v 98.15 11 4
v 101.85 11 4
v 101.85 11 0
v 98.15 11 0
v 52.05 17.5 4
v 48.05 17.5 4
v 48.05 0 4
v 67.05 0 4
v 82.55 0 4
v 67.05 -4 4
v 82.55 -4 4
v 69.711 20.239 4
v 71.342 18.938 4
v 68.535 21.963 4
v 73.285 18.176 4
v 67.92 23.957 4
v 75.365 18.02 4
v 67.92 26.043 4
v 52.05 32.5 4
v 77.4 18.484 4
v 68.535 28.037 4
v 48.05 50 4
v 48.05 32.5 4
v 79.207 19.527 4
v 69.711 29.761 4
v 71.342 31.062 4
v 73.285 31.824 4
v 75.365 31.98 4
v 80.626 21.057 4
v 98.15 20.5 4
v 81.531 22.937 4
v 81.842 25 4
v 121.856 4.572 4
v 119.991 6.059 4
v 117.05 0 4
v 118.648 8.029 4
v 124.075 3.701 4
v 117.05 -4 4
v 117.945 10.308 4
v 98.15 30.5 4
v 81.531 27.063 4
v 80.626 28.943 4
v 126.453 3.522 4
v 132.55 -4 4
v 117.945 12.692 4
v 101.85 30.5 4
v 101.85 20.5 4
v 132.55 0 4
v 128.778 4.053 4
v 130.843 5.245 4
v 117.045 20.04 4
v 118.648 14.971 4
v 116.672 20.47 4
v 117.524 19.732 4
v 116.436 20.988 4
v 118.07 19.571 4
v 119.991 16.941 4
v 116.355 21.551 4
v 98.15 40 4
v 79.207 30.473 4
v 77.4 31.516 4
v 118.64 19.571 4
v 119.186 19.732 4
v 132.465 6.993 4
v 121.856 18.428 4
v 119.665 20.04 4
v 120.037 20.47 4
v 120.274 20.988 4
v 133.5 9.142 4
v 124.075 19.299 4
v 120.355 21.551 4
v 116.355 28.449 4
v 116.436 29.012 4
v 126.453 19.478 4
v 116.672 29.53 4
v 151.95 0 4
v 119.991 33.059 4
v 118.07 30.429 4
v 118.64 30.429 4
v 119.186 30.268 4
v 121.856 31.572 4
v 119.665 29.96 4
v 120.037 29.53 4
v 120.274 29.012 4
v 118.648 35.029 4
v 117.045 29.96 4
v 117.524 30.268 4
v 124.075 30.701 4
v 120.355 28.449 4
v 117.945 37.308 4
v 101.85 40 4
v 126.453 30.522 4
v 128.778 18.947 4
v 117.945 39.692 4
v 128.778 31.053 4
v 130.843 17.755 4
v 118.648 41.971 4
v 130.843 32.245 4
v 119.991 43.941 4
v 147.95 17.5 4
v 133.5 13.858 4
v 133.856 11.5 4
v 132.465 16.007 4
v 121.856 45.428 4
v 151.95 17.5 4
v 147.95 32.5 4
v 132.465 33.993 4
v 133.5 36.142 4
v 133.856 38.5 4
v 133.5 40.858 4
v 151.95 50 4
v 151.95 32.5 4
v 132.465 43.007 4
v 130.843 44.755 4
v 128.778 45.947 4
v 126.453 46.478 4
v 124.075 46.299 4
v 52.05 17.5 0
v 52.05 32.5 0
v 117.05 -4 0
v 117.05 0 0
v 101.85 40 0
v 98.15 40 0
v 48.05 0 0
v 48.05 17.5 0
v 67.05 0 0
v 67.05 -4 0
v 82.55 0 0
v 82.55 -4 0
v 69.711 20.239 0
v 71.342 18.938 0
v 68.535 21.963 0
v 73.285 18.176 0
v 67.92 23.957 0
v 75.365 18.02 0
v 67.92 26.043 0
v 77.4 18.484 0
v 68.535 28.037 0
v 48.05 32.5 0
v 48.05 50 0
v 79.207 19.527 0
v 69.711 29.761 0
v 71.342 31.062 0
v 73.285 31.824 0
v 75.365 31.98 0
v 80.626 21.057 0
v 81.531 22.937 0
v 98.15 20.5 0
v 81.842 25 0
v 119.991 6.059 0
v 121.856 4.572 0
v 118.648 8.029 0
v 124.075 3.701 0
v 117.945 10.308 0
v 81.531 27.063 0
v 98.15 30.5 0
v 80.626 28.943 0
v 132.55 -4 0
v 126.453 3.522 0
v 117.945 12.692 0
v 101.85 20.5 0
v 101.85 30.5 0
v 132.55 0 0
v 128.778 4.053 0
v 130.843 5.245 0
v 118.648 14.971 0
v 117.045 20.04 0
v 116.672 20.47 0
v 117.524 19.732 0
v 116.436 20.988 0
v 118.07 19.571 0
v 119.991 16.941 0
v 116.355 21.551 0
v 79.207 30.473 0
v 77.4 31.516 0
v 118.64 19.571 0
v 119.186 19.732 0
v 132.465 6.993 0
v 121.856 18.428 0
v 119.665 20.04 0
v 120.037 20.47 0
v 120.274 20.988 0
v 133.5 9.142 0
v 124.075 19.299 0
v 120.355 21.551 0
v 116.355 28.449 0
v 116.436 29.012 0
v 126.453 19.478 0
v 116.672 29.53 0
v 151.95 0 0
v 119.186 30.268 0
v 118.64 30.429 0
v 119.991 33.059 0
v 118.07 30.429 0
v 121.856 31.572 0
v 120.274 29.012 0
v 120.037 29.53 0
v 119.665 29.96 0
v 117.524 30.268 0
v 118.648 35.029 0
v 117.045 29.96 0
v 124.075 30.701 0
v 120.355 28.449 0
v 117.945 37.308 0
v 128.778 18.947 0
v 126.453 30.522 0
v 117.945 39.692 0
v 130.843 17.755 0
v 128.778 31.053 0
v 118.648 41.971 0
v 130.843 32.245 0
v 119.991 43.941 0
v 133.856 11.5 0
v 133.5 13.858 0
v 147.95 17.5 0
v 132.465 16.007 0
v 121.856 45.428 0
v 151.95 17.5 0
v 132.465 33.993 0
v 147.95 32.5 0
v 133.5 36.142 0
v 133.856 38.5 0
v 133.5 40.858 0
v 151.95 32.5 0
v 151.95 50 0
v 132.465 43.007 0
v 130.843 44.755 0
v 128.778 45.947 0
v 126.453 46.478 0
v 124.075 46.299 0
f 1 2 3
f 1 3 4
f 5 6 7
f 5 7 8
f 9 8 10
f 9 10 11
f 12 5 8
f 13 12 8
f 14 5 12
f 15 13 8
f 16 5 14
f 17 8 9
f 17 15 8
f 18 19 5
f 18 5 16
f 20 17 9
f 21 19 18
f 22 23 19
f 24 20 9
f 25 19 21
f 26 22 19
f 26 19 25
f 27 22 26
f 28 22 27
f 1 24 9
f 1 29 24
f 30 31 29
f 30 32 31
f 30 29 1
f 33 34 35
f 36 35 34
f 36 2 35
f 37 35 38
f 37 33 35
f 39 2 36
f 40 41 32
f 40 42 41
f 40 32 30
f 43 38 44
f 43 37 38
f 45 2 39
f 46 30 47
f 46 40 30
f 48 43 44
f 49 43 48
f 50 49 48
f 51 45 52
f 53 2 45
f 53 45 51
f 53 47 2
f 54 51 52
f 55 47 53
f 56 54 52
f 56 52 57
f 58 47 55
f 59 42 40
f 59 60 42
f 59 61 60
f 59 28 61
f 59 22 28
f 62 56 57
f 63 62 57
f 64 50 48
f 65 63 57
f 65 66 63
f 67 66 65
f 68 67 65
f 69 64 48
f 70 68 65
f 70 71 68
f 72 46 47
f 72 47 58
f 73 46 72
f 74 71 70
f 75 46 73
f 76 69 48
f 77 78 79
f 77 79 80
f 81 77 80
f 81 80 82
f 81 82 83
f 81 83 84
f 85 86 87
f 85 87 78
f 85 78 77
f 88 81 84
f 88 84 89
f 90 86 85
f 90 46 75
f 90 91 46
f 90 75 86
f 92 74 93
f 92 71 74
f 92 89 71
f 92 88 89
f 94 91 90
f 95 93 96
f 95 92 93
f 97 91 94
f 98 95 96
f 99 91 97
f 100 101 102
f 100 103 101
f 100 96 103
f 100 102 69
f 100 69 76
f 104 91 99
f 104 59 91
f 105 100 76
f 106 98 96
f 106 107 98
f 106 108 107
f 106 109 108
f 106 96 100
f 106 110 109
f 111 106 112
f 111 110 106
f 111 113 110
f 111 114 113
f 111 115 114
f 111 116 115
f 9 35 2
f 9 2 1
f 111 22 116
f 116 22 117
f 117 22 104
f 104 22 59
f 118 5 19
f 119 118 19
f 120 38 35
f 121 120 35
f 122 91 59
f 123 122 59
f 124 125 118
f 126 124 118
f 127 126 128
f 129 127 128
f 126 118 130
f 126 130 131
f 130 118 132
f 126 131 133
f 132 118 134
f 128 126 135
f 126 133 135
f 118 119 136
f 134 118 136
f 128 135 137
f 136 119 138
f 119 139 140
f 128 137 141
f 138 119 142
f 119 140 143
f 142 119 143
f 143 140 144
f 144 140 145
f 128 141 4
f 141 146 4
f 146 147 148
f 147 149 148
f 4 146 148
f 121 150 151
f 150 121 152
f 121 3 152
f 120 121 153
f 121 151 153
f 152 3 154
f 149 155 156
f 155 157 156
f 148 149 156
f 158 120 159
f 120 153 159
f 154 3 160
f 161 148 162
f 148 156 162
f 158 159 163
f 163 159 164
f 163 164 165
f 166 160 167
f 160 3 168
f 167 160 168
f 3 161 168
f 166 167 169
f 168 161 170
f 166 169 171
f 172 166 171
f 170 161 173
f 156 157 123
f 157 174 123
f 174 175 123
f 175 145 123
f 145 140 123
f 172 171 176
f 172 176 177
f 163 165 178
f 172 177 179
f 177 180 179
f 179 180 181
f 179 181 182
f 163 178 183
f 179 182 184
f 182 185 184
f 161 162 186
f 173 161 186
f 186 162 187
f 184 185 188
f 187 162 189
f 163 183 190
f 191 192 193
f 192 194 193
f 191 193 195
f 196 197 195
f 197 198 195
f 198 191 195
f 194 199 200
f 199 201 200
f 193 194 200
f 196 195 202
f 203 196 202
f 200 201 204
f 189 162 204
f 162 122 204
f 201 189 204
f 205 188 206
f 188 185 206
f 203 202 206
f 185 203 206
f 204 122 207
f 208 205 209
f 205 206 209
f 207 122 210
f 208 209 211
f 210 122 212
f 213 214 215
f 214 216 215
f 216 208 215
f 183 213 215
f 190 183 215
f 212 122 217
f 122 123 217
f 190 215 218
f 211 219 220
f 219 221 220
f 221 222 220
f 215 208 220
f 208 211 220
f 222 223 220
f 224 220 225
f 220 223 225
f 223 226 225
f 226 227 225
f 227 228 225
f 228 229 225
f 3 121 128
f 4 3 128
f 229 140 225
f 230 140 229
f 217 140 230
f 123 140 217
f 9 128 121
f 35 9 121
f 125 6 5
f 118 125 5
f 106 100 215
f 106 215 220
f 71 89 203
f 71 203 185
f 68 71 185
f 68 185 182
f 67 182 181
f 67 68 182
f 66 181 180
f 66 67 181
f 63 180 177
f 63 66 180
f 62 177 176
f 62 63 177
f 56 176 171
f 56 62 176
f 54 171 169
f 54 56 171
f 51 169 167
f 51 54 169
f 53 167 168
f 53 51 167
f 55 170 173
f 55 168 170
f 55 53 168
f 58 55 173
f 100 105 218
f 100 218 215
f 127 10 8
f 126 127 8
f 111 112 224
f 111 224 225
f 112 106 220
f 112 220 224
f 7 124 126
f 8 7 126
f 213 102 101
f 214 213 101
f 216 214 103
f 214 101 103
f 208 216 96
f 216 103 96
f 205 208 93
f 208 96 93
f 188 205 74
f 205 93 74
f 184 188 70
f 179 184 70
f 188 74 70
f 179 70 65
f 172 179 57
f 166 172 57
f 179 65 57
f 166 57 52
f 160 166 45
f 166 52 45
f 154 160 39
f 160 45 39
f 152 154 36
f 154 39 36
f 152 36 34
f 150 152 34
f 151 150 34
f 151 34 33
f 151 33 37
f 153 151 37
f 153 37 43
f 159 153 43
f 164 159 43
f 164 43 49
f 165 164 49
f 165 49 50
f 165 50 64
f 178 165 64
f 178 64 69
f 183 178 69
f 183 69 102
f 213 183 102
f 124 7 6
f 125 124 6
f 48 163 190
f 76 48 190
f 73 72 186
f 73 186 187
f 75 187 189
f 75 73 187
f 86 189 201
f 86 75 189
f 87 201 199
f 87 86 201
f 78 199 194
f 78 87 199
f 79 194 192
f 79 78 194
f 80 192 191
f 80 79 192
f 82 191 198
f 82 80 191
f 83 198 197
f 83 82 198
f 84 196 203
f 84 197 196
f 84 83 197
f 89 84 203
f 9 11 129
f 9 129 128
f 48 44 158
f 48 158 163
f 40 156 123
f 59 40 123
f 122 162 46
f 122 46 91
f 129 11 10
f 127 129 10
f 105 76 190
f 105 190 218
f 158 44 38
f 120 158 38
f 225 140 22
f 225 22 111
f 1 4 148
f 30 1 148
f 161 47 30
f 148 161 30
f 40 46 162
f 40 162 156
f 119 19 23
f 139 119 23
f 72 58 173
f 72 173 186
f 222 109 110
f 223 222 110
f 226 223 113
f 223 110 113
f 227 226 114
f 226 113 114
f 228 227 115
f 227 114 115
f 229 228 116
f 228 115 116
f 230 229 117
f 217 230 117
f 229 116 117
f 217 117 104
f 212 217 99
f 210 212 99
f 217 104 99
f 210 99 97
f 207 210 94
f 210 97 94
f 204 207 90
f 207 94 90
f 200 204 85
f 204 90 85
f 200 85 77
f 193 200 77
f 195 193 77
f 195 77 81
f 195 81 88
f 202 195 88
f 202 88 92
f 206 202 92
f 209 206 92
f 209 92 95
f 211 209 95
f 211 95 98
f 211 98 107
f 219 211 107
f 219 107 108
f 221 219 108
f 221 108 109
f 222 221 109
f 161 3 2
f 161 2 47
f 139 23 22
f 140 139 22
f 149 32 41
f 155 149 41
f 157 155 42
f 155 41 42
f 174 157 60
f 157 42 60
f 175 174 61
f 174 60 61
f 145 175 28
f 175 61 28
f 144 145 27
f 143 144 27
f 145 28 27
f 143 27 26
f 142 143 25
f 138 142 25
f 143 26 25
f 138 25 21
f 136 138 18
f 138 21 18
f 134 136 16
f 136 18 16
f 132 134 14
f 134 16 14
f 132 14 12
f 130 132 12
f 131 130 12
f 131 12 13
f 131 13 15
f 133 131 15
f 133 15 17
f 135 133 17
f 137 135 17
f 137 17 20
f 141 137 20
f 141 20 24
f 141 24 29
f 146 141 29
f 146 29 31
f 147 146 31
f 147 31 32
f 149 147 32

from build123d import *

# Parameters (mm, degrees)
SKIZZE1_W                       = 200
SKIZZE1_H                       = 50
AUFSATZ_LINEAR_AUSTRAGEN1_DEPTH = 4
SKIZZE2_W                       = 15.5
SKIZZE2_H                       = 4
AUFSATZ_LINEAR_AUSTRAGEN2_DEPTH = 4
SCHNITT_LINEAR_AUSTRAGEN1_REACH = 6
SKIZZE4_W                       = 4
SKIZZE4_H                       = 15
SCHNITT_LINEAR_AUSTRAGEN2_REACH = 6
SKIZZE5_W                       = 3.7
SKIZZE5_H                       = 9.5
SCHNITT_LINEAR_AUSTRAGEN3_DEPTH = 4
SCHNITT_LINEAR_AUSTRAGEN4_REACH = 6
SKIZZE7_R                       = 8
SKIZZE7_R_2                     = 7


with BuildPart() as part:
    # Skizze1 → Aufsatz-Linear austragen1 (new body)
    with BuildSketch(Plane.XY):
        with Locations((100, 25)):
            Rectangle(SKIZZE1_W, SKIZZE1_H)
    extrude(amount=AUFSATZ_LINEAR_AUSTRAGEN1_DEPTH)

    # Skizze2 → Aufsatz-Linear austragen2 (add)
    with BuildSketch(Plane(origin=(0, 0, 4), x_dir=(-1, 0, 0), z_dir=(0, 0, -1))):
        with Locations((-174.8, -2)):
            Rectangle(SKIZZE2_W, SKIZZE2_H)
        with Locations((-124.8, -2)):
            Rectangle(SKIZZE2_W, SKIZZE2_H)
        with Locations((-74.8, -2)):
            Rectangle(SKIZZE2_W, SKIZZE2_H)
        with Locations((-24.8, -2)):
            Rectangle(SKIZZE2_W, SKIZZE2_H)
    extrude(amount=AUFSATZ_LINEAR_AUSTRAGEN2_DEPTH)

    # Skizze4 → Schnitt-Linear austragen1 (cut, up to next)
    with BuildSketch(Plane.XY.offset(4), mode=Mode.PRIVATE) as schnitt_linear_austragen1_sk1:
        with Locations((2, 25)):
            Rectangle(SKIZZE4_W, SKIZZE4_H)
    schnitt_linear_austragen1_tool1 = extrude(schnitt_linear_austragen1_sk1.sketch, amount=-SCHNITT_LINEAR_AUSTRAGEN1_REACH, mode=Mode.PRIVATE) & part.part
    add(schnitt_linear_austragen1_tool1.solids().sort_by_distance((2, 25, 4))[0], mode=Mode.SUBTRACT)
    # Skizze4 → Schnitt-Linear austragen1 (cut, up to next)
    with BuildSketch(Plane.XY.offset(4), mode=Mode.PRIVATE) as schnitt_linear_austragen1_sk2:
        with Locations((198, 25)):
            Rectangle(SKIZZE4_W, SKIZZE4_H)
    schnitt_linear_austragen1_tool2 = extrude(schnitt_linear_austragen1_sk2.sketch, amount=-SCHNITT_LINEAR_AUSTRAGEN1_REACH, mode=Mode.PRIVATE) & part.part
    add(schnitt_linear_austragen1_tool2.solids().sort_by_distance((198, 25, 4))[0], mode=Mode.SUBTRACT)

    # Skizze5 → Schnitt-Linear austragen2 (cut, up to next)
    with BuildSketch(Plane(origin=(0, 0, 0), x_dir=(-1, 0, 0), z_dir=(0, 0, -1)), mode=Mode.PRIVATE) as schnitt_linear_austragen2_sk1:
        with Locations((-100, 35.25)):
            Rectangle(SKIZZE5_W, SKIZZE5_H)
    schnitt_linear_austragen2_tool1 = extrude(schnitt_linear_austragen2_sk1.sketch, amount=-SCHNITT_LINEAR_AUSTRAGEN2_REACH, mode=Mode.PRIVATE) & part.part
    add(schnitt_linear_austragen2_tool1.solids().sort_by_distance((100, 35.25, 0))[0], mode=Mode.SUBTRACT)
    # Skizze5 → Schnitt-Linear austragen2 (cut, up to next)
    with BuildSketch(Plane(origin=(0, 0, 0), x_dir=(-1, 0, 0), z_dir=(0, 0, -1)), mode=Mode.PRIVATE) as schnitt_linear_austragen2_sk2:
        with Locations((-100, 15.75)):
            Rectangle(SKIZZE5_W, SKIZZE5_H)
    schnitt_linear_austragen2_tool2 = extrude(schnitt_linear_austragen2_sk2.sketch, amount=-SCHNITT_LINEAR_AUSTRAGEN2_REACH, mode=Mode.PRIVATE) & part.part
    add(schnitt_linear_austragen2_tool2.solids().sort_by_distance((100, 15.75, 0))[0], mode=Mode.SUBTRACT)

    # Skizze6 → Schnitt-Linear austragen3 (cut)
    with BuildSketch(Plane.XY.offset(4)):
        Polygon((52.05, 32.5), (48.05, 32.5), (48.05, 66.141635161), (-25.301318738, 66.141635161), (-25.301318738, -17.071359215), (48.05, -17.071359215), (48.05, 17.5), (52.05, 17.5), align=None)
    schnitt_linear_austragen3 = extrude(amount=-SCHNITT_LINEAR_AUSTRAGEN3_DEPTH, mode=Mode.SUBTRACT)

    # Spiegeln1: Schnitt-Linear austragen3 across plane
    add(schnitt_linear_austragen3.mirror(Plane.ZY.offset(-100)), mode=Mode.SUBTRACT)

    # Skizze7 → Schnitt-Linear austragen4 (cut, up to next)
    with BuildSketch(Plane.XY.offset(4), mode=Mode.PRIVATE) as schnitt_linear_austragen4_sk1:
        with Locations((125.855537029, 11.5)):
            Circle(SKIZZE7_R)
    schnitt_linear_austragen4_tool1 = extrude(schnitt_linear_austragen4_sk1.sketch, amount=-SCHNITT_LINEAR_AUSTRAGEN4_REACH, mode=Mode.PRIVATE) & part.part
    add(schnitt_linear_austragen4_tool1.solids().sort_by_distance((125.855537, 11.5, 4))[0], mode=Mode.SUBTRACT)
    # Skizze7 → Schnitt-Linear austragen4 (cut, up to next)
    with BuildSketch(Plane.XY.offset(4), mode=Mode.PRIVATE) as schnitt_linear_austragen4_sk2:
        with Locations((125.855537029, 38.5)):
            Circle(SKIZZE7_R)
    schnitt_linear_austragen4_tool2 = extrude(schnitt_linear_austragen4_sk2.sketch, amount=-SCHNITT_LINEAR_AUSTRAGEN4_REACH, mode=Mode.PRIVATE) & part.part
    add(schnitt_linear_austragen4_tool2.solids().sort_by_distance((125.855537, 38.5, 4))[0], mode=Mode.SUBTRACT)
    # Skizze7 → Schnitt-Linear austragen4 (cut, up to next)
    with BuildSketch(Plane.XY.offset(4), mode=Mode.PRIVATE) as schnitt_linear_austragen4_sk3:
        with Locations((74.842197302, 25)):
            Circle(SKIZZE7_R_2)
    schnitt_linear_austragen4_tool3 = extrude(schnitt_linear_austragen4_sk3.sketch, amount=-SCHNITT_LINEAR_AUSTRAGEN4_REACH, mode=Mode.PRIVATE) & part.part
    add(schnitt_linear_austragen4_tool3.solids().sort_by_distance((74.842197, 25, 4))[0], mode=Mode.SUBTRACT)
    # Skizze7 → Schnitt-Linear austragen4 (cut, up to next)
    with BuildSketch(Plane.XY.offset(4), mode=Mode.PRIVATE) as schnitt_linear_austragen4_sk4:
        with BuildLine():
            Line((120.354935265, 28.448963973), (120.354935265, 21.551036027))
            ThreePointArc((120.354935265, 21.551036027), (118.354935265, 19.551036027), (116.354935265, 21.551036027))
            Line((116.354935265, 21.551036027), (116.354935265, 28.448963973))
            ThreePointArc((116.354935265, 28.448963973), (118.354935265, 30.448963973), (120.354935265, 28.448963973))
        make_face()
    schnitt_linear_austragen4_tool4 = extrude(schnitt_linear_austragen4_sk4.sketch, amount=-SCHNITT_LINEAR_AUSTRAGEN4_REACH, mode=Mode.PRIVATE) & part.part
    add(schnitt_linear_austragen4_tool4.solids().sort_by_distance((118.354935, 25, 4))[0], mode=Mode.SUBTRACT)


solid = part.part
